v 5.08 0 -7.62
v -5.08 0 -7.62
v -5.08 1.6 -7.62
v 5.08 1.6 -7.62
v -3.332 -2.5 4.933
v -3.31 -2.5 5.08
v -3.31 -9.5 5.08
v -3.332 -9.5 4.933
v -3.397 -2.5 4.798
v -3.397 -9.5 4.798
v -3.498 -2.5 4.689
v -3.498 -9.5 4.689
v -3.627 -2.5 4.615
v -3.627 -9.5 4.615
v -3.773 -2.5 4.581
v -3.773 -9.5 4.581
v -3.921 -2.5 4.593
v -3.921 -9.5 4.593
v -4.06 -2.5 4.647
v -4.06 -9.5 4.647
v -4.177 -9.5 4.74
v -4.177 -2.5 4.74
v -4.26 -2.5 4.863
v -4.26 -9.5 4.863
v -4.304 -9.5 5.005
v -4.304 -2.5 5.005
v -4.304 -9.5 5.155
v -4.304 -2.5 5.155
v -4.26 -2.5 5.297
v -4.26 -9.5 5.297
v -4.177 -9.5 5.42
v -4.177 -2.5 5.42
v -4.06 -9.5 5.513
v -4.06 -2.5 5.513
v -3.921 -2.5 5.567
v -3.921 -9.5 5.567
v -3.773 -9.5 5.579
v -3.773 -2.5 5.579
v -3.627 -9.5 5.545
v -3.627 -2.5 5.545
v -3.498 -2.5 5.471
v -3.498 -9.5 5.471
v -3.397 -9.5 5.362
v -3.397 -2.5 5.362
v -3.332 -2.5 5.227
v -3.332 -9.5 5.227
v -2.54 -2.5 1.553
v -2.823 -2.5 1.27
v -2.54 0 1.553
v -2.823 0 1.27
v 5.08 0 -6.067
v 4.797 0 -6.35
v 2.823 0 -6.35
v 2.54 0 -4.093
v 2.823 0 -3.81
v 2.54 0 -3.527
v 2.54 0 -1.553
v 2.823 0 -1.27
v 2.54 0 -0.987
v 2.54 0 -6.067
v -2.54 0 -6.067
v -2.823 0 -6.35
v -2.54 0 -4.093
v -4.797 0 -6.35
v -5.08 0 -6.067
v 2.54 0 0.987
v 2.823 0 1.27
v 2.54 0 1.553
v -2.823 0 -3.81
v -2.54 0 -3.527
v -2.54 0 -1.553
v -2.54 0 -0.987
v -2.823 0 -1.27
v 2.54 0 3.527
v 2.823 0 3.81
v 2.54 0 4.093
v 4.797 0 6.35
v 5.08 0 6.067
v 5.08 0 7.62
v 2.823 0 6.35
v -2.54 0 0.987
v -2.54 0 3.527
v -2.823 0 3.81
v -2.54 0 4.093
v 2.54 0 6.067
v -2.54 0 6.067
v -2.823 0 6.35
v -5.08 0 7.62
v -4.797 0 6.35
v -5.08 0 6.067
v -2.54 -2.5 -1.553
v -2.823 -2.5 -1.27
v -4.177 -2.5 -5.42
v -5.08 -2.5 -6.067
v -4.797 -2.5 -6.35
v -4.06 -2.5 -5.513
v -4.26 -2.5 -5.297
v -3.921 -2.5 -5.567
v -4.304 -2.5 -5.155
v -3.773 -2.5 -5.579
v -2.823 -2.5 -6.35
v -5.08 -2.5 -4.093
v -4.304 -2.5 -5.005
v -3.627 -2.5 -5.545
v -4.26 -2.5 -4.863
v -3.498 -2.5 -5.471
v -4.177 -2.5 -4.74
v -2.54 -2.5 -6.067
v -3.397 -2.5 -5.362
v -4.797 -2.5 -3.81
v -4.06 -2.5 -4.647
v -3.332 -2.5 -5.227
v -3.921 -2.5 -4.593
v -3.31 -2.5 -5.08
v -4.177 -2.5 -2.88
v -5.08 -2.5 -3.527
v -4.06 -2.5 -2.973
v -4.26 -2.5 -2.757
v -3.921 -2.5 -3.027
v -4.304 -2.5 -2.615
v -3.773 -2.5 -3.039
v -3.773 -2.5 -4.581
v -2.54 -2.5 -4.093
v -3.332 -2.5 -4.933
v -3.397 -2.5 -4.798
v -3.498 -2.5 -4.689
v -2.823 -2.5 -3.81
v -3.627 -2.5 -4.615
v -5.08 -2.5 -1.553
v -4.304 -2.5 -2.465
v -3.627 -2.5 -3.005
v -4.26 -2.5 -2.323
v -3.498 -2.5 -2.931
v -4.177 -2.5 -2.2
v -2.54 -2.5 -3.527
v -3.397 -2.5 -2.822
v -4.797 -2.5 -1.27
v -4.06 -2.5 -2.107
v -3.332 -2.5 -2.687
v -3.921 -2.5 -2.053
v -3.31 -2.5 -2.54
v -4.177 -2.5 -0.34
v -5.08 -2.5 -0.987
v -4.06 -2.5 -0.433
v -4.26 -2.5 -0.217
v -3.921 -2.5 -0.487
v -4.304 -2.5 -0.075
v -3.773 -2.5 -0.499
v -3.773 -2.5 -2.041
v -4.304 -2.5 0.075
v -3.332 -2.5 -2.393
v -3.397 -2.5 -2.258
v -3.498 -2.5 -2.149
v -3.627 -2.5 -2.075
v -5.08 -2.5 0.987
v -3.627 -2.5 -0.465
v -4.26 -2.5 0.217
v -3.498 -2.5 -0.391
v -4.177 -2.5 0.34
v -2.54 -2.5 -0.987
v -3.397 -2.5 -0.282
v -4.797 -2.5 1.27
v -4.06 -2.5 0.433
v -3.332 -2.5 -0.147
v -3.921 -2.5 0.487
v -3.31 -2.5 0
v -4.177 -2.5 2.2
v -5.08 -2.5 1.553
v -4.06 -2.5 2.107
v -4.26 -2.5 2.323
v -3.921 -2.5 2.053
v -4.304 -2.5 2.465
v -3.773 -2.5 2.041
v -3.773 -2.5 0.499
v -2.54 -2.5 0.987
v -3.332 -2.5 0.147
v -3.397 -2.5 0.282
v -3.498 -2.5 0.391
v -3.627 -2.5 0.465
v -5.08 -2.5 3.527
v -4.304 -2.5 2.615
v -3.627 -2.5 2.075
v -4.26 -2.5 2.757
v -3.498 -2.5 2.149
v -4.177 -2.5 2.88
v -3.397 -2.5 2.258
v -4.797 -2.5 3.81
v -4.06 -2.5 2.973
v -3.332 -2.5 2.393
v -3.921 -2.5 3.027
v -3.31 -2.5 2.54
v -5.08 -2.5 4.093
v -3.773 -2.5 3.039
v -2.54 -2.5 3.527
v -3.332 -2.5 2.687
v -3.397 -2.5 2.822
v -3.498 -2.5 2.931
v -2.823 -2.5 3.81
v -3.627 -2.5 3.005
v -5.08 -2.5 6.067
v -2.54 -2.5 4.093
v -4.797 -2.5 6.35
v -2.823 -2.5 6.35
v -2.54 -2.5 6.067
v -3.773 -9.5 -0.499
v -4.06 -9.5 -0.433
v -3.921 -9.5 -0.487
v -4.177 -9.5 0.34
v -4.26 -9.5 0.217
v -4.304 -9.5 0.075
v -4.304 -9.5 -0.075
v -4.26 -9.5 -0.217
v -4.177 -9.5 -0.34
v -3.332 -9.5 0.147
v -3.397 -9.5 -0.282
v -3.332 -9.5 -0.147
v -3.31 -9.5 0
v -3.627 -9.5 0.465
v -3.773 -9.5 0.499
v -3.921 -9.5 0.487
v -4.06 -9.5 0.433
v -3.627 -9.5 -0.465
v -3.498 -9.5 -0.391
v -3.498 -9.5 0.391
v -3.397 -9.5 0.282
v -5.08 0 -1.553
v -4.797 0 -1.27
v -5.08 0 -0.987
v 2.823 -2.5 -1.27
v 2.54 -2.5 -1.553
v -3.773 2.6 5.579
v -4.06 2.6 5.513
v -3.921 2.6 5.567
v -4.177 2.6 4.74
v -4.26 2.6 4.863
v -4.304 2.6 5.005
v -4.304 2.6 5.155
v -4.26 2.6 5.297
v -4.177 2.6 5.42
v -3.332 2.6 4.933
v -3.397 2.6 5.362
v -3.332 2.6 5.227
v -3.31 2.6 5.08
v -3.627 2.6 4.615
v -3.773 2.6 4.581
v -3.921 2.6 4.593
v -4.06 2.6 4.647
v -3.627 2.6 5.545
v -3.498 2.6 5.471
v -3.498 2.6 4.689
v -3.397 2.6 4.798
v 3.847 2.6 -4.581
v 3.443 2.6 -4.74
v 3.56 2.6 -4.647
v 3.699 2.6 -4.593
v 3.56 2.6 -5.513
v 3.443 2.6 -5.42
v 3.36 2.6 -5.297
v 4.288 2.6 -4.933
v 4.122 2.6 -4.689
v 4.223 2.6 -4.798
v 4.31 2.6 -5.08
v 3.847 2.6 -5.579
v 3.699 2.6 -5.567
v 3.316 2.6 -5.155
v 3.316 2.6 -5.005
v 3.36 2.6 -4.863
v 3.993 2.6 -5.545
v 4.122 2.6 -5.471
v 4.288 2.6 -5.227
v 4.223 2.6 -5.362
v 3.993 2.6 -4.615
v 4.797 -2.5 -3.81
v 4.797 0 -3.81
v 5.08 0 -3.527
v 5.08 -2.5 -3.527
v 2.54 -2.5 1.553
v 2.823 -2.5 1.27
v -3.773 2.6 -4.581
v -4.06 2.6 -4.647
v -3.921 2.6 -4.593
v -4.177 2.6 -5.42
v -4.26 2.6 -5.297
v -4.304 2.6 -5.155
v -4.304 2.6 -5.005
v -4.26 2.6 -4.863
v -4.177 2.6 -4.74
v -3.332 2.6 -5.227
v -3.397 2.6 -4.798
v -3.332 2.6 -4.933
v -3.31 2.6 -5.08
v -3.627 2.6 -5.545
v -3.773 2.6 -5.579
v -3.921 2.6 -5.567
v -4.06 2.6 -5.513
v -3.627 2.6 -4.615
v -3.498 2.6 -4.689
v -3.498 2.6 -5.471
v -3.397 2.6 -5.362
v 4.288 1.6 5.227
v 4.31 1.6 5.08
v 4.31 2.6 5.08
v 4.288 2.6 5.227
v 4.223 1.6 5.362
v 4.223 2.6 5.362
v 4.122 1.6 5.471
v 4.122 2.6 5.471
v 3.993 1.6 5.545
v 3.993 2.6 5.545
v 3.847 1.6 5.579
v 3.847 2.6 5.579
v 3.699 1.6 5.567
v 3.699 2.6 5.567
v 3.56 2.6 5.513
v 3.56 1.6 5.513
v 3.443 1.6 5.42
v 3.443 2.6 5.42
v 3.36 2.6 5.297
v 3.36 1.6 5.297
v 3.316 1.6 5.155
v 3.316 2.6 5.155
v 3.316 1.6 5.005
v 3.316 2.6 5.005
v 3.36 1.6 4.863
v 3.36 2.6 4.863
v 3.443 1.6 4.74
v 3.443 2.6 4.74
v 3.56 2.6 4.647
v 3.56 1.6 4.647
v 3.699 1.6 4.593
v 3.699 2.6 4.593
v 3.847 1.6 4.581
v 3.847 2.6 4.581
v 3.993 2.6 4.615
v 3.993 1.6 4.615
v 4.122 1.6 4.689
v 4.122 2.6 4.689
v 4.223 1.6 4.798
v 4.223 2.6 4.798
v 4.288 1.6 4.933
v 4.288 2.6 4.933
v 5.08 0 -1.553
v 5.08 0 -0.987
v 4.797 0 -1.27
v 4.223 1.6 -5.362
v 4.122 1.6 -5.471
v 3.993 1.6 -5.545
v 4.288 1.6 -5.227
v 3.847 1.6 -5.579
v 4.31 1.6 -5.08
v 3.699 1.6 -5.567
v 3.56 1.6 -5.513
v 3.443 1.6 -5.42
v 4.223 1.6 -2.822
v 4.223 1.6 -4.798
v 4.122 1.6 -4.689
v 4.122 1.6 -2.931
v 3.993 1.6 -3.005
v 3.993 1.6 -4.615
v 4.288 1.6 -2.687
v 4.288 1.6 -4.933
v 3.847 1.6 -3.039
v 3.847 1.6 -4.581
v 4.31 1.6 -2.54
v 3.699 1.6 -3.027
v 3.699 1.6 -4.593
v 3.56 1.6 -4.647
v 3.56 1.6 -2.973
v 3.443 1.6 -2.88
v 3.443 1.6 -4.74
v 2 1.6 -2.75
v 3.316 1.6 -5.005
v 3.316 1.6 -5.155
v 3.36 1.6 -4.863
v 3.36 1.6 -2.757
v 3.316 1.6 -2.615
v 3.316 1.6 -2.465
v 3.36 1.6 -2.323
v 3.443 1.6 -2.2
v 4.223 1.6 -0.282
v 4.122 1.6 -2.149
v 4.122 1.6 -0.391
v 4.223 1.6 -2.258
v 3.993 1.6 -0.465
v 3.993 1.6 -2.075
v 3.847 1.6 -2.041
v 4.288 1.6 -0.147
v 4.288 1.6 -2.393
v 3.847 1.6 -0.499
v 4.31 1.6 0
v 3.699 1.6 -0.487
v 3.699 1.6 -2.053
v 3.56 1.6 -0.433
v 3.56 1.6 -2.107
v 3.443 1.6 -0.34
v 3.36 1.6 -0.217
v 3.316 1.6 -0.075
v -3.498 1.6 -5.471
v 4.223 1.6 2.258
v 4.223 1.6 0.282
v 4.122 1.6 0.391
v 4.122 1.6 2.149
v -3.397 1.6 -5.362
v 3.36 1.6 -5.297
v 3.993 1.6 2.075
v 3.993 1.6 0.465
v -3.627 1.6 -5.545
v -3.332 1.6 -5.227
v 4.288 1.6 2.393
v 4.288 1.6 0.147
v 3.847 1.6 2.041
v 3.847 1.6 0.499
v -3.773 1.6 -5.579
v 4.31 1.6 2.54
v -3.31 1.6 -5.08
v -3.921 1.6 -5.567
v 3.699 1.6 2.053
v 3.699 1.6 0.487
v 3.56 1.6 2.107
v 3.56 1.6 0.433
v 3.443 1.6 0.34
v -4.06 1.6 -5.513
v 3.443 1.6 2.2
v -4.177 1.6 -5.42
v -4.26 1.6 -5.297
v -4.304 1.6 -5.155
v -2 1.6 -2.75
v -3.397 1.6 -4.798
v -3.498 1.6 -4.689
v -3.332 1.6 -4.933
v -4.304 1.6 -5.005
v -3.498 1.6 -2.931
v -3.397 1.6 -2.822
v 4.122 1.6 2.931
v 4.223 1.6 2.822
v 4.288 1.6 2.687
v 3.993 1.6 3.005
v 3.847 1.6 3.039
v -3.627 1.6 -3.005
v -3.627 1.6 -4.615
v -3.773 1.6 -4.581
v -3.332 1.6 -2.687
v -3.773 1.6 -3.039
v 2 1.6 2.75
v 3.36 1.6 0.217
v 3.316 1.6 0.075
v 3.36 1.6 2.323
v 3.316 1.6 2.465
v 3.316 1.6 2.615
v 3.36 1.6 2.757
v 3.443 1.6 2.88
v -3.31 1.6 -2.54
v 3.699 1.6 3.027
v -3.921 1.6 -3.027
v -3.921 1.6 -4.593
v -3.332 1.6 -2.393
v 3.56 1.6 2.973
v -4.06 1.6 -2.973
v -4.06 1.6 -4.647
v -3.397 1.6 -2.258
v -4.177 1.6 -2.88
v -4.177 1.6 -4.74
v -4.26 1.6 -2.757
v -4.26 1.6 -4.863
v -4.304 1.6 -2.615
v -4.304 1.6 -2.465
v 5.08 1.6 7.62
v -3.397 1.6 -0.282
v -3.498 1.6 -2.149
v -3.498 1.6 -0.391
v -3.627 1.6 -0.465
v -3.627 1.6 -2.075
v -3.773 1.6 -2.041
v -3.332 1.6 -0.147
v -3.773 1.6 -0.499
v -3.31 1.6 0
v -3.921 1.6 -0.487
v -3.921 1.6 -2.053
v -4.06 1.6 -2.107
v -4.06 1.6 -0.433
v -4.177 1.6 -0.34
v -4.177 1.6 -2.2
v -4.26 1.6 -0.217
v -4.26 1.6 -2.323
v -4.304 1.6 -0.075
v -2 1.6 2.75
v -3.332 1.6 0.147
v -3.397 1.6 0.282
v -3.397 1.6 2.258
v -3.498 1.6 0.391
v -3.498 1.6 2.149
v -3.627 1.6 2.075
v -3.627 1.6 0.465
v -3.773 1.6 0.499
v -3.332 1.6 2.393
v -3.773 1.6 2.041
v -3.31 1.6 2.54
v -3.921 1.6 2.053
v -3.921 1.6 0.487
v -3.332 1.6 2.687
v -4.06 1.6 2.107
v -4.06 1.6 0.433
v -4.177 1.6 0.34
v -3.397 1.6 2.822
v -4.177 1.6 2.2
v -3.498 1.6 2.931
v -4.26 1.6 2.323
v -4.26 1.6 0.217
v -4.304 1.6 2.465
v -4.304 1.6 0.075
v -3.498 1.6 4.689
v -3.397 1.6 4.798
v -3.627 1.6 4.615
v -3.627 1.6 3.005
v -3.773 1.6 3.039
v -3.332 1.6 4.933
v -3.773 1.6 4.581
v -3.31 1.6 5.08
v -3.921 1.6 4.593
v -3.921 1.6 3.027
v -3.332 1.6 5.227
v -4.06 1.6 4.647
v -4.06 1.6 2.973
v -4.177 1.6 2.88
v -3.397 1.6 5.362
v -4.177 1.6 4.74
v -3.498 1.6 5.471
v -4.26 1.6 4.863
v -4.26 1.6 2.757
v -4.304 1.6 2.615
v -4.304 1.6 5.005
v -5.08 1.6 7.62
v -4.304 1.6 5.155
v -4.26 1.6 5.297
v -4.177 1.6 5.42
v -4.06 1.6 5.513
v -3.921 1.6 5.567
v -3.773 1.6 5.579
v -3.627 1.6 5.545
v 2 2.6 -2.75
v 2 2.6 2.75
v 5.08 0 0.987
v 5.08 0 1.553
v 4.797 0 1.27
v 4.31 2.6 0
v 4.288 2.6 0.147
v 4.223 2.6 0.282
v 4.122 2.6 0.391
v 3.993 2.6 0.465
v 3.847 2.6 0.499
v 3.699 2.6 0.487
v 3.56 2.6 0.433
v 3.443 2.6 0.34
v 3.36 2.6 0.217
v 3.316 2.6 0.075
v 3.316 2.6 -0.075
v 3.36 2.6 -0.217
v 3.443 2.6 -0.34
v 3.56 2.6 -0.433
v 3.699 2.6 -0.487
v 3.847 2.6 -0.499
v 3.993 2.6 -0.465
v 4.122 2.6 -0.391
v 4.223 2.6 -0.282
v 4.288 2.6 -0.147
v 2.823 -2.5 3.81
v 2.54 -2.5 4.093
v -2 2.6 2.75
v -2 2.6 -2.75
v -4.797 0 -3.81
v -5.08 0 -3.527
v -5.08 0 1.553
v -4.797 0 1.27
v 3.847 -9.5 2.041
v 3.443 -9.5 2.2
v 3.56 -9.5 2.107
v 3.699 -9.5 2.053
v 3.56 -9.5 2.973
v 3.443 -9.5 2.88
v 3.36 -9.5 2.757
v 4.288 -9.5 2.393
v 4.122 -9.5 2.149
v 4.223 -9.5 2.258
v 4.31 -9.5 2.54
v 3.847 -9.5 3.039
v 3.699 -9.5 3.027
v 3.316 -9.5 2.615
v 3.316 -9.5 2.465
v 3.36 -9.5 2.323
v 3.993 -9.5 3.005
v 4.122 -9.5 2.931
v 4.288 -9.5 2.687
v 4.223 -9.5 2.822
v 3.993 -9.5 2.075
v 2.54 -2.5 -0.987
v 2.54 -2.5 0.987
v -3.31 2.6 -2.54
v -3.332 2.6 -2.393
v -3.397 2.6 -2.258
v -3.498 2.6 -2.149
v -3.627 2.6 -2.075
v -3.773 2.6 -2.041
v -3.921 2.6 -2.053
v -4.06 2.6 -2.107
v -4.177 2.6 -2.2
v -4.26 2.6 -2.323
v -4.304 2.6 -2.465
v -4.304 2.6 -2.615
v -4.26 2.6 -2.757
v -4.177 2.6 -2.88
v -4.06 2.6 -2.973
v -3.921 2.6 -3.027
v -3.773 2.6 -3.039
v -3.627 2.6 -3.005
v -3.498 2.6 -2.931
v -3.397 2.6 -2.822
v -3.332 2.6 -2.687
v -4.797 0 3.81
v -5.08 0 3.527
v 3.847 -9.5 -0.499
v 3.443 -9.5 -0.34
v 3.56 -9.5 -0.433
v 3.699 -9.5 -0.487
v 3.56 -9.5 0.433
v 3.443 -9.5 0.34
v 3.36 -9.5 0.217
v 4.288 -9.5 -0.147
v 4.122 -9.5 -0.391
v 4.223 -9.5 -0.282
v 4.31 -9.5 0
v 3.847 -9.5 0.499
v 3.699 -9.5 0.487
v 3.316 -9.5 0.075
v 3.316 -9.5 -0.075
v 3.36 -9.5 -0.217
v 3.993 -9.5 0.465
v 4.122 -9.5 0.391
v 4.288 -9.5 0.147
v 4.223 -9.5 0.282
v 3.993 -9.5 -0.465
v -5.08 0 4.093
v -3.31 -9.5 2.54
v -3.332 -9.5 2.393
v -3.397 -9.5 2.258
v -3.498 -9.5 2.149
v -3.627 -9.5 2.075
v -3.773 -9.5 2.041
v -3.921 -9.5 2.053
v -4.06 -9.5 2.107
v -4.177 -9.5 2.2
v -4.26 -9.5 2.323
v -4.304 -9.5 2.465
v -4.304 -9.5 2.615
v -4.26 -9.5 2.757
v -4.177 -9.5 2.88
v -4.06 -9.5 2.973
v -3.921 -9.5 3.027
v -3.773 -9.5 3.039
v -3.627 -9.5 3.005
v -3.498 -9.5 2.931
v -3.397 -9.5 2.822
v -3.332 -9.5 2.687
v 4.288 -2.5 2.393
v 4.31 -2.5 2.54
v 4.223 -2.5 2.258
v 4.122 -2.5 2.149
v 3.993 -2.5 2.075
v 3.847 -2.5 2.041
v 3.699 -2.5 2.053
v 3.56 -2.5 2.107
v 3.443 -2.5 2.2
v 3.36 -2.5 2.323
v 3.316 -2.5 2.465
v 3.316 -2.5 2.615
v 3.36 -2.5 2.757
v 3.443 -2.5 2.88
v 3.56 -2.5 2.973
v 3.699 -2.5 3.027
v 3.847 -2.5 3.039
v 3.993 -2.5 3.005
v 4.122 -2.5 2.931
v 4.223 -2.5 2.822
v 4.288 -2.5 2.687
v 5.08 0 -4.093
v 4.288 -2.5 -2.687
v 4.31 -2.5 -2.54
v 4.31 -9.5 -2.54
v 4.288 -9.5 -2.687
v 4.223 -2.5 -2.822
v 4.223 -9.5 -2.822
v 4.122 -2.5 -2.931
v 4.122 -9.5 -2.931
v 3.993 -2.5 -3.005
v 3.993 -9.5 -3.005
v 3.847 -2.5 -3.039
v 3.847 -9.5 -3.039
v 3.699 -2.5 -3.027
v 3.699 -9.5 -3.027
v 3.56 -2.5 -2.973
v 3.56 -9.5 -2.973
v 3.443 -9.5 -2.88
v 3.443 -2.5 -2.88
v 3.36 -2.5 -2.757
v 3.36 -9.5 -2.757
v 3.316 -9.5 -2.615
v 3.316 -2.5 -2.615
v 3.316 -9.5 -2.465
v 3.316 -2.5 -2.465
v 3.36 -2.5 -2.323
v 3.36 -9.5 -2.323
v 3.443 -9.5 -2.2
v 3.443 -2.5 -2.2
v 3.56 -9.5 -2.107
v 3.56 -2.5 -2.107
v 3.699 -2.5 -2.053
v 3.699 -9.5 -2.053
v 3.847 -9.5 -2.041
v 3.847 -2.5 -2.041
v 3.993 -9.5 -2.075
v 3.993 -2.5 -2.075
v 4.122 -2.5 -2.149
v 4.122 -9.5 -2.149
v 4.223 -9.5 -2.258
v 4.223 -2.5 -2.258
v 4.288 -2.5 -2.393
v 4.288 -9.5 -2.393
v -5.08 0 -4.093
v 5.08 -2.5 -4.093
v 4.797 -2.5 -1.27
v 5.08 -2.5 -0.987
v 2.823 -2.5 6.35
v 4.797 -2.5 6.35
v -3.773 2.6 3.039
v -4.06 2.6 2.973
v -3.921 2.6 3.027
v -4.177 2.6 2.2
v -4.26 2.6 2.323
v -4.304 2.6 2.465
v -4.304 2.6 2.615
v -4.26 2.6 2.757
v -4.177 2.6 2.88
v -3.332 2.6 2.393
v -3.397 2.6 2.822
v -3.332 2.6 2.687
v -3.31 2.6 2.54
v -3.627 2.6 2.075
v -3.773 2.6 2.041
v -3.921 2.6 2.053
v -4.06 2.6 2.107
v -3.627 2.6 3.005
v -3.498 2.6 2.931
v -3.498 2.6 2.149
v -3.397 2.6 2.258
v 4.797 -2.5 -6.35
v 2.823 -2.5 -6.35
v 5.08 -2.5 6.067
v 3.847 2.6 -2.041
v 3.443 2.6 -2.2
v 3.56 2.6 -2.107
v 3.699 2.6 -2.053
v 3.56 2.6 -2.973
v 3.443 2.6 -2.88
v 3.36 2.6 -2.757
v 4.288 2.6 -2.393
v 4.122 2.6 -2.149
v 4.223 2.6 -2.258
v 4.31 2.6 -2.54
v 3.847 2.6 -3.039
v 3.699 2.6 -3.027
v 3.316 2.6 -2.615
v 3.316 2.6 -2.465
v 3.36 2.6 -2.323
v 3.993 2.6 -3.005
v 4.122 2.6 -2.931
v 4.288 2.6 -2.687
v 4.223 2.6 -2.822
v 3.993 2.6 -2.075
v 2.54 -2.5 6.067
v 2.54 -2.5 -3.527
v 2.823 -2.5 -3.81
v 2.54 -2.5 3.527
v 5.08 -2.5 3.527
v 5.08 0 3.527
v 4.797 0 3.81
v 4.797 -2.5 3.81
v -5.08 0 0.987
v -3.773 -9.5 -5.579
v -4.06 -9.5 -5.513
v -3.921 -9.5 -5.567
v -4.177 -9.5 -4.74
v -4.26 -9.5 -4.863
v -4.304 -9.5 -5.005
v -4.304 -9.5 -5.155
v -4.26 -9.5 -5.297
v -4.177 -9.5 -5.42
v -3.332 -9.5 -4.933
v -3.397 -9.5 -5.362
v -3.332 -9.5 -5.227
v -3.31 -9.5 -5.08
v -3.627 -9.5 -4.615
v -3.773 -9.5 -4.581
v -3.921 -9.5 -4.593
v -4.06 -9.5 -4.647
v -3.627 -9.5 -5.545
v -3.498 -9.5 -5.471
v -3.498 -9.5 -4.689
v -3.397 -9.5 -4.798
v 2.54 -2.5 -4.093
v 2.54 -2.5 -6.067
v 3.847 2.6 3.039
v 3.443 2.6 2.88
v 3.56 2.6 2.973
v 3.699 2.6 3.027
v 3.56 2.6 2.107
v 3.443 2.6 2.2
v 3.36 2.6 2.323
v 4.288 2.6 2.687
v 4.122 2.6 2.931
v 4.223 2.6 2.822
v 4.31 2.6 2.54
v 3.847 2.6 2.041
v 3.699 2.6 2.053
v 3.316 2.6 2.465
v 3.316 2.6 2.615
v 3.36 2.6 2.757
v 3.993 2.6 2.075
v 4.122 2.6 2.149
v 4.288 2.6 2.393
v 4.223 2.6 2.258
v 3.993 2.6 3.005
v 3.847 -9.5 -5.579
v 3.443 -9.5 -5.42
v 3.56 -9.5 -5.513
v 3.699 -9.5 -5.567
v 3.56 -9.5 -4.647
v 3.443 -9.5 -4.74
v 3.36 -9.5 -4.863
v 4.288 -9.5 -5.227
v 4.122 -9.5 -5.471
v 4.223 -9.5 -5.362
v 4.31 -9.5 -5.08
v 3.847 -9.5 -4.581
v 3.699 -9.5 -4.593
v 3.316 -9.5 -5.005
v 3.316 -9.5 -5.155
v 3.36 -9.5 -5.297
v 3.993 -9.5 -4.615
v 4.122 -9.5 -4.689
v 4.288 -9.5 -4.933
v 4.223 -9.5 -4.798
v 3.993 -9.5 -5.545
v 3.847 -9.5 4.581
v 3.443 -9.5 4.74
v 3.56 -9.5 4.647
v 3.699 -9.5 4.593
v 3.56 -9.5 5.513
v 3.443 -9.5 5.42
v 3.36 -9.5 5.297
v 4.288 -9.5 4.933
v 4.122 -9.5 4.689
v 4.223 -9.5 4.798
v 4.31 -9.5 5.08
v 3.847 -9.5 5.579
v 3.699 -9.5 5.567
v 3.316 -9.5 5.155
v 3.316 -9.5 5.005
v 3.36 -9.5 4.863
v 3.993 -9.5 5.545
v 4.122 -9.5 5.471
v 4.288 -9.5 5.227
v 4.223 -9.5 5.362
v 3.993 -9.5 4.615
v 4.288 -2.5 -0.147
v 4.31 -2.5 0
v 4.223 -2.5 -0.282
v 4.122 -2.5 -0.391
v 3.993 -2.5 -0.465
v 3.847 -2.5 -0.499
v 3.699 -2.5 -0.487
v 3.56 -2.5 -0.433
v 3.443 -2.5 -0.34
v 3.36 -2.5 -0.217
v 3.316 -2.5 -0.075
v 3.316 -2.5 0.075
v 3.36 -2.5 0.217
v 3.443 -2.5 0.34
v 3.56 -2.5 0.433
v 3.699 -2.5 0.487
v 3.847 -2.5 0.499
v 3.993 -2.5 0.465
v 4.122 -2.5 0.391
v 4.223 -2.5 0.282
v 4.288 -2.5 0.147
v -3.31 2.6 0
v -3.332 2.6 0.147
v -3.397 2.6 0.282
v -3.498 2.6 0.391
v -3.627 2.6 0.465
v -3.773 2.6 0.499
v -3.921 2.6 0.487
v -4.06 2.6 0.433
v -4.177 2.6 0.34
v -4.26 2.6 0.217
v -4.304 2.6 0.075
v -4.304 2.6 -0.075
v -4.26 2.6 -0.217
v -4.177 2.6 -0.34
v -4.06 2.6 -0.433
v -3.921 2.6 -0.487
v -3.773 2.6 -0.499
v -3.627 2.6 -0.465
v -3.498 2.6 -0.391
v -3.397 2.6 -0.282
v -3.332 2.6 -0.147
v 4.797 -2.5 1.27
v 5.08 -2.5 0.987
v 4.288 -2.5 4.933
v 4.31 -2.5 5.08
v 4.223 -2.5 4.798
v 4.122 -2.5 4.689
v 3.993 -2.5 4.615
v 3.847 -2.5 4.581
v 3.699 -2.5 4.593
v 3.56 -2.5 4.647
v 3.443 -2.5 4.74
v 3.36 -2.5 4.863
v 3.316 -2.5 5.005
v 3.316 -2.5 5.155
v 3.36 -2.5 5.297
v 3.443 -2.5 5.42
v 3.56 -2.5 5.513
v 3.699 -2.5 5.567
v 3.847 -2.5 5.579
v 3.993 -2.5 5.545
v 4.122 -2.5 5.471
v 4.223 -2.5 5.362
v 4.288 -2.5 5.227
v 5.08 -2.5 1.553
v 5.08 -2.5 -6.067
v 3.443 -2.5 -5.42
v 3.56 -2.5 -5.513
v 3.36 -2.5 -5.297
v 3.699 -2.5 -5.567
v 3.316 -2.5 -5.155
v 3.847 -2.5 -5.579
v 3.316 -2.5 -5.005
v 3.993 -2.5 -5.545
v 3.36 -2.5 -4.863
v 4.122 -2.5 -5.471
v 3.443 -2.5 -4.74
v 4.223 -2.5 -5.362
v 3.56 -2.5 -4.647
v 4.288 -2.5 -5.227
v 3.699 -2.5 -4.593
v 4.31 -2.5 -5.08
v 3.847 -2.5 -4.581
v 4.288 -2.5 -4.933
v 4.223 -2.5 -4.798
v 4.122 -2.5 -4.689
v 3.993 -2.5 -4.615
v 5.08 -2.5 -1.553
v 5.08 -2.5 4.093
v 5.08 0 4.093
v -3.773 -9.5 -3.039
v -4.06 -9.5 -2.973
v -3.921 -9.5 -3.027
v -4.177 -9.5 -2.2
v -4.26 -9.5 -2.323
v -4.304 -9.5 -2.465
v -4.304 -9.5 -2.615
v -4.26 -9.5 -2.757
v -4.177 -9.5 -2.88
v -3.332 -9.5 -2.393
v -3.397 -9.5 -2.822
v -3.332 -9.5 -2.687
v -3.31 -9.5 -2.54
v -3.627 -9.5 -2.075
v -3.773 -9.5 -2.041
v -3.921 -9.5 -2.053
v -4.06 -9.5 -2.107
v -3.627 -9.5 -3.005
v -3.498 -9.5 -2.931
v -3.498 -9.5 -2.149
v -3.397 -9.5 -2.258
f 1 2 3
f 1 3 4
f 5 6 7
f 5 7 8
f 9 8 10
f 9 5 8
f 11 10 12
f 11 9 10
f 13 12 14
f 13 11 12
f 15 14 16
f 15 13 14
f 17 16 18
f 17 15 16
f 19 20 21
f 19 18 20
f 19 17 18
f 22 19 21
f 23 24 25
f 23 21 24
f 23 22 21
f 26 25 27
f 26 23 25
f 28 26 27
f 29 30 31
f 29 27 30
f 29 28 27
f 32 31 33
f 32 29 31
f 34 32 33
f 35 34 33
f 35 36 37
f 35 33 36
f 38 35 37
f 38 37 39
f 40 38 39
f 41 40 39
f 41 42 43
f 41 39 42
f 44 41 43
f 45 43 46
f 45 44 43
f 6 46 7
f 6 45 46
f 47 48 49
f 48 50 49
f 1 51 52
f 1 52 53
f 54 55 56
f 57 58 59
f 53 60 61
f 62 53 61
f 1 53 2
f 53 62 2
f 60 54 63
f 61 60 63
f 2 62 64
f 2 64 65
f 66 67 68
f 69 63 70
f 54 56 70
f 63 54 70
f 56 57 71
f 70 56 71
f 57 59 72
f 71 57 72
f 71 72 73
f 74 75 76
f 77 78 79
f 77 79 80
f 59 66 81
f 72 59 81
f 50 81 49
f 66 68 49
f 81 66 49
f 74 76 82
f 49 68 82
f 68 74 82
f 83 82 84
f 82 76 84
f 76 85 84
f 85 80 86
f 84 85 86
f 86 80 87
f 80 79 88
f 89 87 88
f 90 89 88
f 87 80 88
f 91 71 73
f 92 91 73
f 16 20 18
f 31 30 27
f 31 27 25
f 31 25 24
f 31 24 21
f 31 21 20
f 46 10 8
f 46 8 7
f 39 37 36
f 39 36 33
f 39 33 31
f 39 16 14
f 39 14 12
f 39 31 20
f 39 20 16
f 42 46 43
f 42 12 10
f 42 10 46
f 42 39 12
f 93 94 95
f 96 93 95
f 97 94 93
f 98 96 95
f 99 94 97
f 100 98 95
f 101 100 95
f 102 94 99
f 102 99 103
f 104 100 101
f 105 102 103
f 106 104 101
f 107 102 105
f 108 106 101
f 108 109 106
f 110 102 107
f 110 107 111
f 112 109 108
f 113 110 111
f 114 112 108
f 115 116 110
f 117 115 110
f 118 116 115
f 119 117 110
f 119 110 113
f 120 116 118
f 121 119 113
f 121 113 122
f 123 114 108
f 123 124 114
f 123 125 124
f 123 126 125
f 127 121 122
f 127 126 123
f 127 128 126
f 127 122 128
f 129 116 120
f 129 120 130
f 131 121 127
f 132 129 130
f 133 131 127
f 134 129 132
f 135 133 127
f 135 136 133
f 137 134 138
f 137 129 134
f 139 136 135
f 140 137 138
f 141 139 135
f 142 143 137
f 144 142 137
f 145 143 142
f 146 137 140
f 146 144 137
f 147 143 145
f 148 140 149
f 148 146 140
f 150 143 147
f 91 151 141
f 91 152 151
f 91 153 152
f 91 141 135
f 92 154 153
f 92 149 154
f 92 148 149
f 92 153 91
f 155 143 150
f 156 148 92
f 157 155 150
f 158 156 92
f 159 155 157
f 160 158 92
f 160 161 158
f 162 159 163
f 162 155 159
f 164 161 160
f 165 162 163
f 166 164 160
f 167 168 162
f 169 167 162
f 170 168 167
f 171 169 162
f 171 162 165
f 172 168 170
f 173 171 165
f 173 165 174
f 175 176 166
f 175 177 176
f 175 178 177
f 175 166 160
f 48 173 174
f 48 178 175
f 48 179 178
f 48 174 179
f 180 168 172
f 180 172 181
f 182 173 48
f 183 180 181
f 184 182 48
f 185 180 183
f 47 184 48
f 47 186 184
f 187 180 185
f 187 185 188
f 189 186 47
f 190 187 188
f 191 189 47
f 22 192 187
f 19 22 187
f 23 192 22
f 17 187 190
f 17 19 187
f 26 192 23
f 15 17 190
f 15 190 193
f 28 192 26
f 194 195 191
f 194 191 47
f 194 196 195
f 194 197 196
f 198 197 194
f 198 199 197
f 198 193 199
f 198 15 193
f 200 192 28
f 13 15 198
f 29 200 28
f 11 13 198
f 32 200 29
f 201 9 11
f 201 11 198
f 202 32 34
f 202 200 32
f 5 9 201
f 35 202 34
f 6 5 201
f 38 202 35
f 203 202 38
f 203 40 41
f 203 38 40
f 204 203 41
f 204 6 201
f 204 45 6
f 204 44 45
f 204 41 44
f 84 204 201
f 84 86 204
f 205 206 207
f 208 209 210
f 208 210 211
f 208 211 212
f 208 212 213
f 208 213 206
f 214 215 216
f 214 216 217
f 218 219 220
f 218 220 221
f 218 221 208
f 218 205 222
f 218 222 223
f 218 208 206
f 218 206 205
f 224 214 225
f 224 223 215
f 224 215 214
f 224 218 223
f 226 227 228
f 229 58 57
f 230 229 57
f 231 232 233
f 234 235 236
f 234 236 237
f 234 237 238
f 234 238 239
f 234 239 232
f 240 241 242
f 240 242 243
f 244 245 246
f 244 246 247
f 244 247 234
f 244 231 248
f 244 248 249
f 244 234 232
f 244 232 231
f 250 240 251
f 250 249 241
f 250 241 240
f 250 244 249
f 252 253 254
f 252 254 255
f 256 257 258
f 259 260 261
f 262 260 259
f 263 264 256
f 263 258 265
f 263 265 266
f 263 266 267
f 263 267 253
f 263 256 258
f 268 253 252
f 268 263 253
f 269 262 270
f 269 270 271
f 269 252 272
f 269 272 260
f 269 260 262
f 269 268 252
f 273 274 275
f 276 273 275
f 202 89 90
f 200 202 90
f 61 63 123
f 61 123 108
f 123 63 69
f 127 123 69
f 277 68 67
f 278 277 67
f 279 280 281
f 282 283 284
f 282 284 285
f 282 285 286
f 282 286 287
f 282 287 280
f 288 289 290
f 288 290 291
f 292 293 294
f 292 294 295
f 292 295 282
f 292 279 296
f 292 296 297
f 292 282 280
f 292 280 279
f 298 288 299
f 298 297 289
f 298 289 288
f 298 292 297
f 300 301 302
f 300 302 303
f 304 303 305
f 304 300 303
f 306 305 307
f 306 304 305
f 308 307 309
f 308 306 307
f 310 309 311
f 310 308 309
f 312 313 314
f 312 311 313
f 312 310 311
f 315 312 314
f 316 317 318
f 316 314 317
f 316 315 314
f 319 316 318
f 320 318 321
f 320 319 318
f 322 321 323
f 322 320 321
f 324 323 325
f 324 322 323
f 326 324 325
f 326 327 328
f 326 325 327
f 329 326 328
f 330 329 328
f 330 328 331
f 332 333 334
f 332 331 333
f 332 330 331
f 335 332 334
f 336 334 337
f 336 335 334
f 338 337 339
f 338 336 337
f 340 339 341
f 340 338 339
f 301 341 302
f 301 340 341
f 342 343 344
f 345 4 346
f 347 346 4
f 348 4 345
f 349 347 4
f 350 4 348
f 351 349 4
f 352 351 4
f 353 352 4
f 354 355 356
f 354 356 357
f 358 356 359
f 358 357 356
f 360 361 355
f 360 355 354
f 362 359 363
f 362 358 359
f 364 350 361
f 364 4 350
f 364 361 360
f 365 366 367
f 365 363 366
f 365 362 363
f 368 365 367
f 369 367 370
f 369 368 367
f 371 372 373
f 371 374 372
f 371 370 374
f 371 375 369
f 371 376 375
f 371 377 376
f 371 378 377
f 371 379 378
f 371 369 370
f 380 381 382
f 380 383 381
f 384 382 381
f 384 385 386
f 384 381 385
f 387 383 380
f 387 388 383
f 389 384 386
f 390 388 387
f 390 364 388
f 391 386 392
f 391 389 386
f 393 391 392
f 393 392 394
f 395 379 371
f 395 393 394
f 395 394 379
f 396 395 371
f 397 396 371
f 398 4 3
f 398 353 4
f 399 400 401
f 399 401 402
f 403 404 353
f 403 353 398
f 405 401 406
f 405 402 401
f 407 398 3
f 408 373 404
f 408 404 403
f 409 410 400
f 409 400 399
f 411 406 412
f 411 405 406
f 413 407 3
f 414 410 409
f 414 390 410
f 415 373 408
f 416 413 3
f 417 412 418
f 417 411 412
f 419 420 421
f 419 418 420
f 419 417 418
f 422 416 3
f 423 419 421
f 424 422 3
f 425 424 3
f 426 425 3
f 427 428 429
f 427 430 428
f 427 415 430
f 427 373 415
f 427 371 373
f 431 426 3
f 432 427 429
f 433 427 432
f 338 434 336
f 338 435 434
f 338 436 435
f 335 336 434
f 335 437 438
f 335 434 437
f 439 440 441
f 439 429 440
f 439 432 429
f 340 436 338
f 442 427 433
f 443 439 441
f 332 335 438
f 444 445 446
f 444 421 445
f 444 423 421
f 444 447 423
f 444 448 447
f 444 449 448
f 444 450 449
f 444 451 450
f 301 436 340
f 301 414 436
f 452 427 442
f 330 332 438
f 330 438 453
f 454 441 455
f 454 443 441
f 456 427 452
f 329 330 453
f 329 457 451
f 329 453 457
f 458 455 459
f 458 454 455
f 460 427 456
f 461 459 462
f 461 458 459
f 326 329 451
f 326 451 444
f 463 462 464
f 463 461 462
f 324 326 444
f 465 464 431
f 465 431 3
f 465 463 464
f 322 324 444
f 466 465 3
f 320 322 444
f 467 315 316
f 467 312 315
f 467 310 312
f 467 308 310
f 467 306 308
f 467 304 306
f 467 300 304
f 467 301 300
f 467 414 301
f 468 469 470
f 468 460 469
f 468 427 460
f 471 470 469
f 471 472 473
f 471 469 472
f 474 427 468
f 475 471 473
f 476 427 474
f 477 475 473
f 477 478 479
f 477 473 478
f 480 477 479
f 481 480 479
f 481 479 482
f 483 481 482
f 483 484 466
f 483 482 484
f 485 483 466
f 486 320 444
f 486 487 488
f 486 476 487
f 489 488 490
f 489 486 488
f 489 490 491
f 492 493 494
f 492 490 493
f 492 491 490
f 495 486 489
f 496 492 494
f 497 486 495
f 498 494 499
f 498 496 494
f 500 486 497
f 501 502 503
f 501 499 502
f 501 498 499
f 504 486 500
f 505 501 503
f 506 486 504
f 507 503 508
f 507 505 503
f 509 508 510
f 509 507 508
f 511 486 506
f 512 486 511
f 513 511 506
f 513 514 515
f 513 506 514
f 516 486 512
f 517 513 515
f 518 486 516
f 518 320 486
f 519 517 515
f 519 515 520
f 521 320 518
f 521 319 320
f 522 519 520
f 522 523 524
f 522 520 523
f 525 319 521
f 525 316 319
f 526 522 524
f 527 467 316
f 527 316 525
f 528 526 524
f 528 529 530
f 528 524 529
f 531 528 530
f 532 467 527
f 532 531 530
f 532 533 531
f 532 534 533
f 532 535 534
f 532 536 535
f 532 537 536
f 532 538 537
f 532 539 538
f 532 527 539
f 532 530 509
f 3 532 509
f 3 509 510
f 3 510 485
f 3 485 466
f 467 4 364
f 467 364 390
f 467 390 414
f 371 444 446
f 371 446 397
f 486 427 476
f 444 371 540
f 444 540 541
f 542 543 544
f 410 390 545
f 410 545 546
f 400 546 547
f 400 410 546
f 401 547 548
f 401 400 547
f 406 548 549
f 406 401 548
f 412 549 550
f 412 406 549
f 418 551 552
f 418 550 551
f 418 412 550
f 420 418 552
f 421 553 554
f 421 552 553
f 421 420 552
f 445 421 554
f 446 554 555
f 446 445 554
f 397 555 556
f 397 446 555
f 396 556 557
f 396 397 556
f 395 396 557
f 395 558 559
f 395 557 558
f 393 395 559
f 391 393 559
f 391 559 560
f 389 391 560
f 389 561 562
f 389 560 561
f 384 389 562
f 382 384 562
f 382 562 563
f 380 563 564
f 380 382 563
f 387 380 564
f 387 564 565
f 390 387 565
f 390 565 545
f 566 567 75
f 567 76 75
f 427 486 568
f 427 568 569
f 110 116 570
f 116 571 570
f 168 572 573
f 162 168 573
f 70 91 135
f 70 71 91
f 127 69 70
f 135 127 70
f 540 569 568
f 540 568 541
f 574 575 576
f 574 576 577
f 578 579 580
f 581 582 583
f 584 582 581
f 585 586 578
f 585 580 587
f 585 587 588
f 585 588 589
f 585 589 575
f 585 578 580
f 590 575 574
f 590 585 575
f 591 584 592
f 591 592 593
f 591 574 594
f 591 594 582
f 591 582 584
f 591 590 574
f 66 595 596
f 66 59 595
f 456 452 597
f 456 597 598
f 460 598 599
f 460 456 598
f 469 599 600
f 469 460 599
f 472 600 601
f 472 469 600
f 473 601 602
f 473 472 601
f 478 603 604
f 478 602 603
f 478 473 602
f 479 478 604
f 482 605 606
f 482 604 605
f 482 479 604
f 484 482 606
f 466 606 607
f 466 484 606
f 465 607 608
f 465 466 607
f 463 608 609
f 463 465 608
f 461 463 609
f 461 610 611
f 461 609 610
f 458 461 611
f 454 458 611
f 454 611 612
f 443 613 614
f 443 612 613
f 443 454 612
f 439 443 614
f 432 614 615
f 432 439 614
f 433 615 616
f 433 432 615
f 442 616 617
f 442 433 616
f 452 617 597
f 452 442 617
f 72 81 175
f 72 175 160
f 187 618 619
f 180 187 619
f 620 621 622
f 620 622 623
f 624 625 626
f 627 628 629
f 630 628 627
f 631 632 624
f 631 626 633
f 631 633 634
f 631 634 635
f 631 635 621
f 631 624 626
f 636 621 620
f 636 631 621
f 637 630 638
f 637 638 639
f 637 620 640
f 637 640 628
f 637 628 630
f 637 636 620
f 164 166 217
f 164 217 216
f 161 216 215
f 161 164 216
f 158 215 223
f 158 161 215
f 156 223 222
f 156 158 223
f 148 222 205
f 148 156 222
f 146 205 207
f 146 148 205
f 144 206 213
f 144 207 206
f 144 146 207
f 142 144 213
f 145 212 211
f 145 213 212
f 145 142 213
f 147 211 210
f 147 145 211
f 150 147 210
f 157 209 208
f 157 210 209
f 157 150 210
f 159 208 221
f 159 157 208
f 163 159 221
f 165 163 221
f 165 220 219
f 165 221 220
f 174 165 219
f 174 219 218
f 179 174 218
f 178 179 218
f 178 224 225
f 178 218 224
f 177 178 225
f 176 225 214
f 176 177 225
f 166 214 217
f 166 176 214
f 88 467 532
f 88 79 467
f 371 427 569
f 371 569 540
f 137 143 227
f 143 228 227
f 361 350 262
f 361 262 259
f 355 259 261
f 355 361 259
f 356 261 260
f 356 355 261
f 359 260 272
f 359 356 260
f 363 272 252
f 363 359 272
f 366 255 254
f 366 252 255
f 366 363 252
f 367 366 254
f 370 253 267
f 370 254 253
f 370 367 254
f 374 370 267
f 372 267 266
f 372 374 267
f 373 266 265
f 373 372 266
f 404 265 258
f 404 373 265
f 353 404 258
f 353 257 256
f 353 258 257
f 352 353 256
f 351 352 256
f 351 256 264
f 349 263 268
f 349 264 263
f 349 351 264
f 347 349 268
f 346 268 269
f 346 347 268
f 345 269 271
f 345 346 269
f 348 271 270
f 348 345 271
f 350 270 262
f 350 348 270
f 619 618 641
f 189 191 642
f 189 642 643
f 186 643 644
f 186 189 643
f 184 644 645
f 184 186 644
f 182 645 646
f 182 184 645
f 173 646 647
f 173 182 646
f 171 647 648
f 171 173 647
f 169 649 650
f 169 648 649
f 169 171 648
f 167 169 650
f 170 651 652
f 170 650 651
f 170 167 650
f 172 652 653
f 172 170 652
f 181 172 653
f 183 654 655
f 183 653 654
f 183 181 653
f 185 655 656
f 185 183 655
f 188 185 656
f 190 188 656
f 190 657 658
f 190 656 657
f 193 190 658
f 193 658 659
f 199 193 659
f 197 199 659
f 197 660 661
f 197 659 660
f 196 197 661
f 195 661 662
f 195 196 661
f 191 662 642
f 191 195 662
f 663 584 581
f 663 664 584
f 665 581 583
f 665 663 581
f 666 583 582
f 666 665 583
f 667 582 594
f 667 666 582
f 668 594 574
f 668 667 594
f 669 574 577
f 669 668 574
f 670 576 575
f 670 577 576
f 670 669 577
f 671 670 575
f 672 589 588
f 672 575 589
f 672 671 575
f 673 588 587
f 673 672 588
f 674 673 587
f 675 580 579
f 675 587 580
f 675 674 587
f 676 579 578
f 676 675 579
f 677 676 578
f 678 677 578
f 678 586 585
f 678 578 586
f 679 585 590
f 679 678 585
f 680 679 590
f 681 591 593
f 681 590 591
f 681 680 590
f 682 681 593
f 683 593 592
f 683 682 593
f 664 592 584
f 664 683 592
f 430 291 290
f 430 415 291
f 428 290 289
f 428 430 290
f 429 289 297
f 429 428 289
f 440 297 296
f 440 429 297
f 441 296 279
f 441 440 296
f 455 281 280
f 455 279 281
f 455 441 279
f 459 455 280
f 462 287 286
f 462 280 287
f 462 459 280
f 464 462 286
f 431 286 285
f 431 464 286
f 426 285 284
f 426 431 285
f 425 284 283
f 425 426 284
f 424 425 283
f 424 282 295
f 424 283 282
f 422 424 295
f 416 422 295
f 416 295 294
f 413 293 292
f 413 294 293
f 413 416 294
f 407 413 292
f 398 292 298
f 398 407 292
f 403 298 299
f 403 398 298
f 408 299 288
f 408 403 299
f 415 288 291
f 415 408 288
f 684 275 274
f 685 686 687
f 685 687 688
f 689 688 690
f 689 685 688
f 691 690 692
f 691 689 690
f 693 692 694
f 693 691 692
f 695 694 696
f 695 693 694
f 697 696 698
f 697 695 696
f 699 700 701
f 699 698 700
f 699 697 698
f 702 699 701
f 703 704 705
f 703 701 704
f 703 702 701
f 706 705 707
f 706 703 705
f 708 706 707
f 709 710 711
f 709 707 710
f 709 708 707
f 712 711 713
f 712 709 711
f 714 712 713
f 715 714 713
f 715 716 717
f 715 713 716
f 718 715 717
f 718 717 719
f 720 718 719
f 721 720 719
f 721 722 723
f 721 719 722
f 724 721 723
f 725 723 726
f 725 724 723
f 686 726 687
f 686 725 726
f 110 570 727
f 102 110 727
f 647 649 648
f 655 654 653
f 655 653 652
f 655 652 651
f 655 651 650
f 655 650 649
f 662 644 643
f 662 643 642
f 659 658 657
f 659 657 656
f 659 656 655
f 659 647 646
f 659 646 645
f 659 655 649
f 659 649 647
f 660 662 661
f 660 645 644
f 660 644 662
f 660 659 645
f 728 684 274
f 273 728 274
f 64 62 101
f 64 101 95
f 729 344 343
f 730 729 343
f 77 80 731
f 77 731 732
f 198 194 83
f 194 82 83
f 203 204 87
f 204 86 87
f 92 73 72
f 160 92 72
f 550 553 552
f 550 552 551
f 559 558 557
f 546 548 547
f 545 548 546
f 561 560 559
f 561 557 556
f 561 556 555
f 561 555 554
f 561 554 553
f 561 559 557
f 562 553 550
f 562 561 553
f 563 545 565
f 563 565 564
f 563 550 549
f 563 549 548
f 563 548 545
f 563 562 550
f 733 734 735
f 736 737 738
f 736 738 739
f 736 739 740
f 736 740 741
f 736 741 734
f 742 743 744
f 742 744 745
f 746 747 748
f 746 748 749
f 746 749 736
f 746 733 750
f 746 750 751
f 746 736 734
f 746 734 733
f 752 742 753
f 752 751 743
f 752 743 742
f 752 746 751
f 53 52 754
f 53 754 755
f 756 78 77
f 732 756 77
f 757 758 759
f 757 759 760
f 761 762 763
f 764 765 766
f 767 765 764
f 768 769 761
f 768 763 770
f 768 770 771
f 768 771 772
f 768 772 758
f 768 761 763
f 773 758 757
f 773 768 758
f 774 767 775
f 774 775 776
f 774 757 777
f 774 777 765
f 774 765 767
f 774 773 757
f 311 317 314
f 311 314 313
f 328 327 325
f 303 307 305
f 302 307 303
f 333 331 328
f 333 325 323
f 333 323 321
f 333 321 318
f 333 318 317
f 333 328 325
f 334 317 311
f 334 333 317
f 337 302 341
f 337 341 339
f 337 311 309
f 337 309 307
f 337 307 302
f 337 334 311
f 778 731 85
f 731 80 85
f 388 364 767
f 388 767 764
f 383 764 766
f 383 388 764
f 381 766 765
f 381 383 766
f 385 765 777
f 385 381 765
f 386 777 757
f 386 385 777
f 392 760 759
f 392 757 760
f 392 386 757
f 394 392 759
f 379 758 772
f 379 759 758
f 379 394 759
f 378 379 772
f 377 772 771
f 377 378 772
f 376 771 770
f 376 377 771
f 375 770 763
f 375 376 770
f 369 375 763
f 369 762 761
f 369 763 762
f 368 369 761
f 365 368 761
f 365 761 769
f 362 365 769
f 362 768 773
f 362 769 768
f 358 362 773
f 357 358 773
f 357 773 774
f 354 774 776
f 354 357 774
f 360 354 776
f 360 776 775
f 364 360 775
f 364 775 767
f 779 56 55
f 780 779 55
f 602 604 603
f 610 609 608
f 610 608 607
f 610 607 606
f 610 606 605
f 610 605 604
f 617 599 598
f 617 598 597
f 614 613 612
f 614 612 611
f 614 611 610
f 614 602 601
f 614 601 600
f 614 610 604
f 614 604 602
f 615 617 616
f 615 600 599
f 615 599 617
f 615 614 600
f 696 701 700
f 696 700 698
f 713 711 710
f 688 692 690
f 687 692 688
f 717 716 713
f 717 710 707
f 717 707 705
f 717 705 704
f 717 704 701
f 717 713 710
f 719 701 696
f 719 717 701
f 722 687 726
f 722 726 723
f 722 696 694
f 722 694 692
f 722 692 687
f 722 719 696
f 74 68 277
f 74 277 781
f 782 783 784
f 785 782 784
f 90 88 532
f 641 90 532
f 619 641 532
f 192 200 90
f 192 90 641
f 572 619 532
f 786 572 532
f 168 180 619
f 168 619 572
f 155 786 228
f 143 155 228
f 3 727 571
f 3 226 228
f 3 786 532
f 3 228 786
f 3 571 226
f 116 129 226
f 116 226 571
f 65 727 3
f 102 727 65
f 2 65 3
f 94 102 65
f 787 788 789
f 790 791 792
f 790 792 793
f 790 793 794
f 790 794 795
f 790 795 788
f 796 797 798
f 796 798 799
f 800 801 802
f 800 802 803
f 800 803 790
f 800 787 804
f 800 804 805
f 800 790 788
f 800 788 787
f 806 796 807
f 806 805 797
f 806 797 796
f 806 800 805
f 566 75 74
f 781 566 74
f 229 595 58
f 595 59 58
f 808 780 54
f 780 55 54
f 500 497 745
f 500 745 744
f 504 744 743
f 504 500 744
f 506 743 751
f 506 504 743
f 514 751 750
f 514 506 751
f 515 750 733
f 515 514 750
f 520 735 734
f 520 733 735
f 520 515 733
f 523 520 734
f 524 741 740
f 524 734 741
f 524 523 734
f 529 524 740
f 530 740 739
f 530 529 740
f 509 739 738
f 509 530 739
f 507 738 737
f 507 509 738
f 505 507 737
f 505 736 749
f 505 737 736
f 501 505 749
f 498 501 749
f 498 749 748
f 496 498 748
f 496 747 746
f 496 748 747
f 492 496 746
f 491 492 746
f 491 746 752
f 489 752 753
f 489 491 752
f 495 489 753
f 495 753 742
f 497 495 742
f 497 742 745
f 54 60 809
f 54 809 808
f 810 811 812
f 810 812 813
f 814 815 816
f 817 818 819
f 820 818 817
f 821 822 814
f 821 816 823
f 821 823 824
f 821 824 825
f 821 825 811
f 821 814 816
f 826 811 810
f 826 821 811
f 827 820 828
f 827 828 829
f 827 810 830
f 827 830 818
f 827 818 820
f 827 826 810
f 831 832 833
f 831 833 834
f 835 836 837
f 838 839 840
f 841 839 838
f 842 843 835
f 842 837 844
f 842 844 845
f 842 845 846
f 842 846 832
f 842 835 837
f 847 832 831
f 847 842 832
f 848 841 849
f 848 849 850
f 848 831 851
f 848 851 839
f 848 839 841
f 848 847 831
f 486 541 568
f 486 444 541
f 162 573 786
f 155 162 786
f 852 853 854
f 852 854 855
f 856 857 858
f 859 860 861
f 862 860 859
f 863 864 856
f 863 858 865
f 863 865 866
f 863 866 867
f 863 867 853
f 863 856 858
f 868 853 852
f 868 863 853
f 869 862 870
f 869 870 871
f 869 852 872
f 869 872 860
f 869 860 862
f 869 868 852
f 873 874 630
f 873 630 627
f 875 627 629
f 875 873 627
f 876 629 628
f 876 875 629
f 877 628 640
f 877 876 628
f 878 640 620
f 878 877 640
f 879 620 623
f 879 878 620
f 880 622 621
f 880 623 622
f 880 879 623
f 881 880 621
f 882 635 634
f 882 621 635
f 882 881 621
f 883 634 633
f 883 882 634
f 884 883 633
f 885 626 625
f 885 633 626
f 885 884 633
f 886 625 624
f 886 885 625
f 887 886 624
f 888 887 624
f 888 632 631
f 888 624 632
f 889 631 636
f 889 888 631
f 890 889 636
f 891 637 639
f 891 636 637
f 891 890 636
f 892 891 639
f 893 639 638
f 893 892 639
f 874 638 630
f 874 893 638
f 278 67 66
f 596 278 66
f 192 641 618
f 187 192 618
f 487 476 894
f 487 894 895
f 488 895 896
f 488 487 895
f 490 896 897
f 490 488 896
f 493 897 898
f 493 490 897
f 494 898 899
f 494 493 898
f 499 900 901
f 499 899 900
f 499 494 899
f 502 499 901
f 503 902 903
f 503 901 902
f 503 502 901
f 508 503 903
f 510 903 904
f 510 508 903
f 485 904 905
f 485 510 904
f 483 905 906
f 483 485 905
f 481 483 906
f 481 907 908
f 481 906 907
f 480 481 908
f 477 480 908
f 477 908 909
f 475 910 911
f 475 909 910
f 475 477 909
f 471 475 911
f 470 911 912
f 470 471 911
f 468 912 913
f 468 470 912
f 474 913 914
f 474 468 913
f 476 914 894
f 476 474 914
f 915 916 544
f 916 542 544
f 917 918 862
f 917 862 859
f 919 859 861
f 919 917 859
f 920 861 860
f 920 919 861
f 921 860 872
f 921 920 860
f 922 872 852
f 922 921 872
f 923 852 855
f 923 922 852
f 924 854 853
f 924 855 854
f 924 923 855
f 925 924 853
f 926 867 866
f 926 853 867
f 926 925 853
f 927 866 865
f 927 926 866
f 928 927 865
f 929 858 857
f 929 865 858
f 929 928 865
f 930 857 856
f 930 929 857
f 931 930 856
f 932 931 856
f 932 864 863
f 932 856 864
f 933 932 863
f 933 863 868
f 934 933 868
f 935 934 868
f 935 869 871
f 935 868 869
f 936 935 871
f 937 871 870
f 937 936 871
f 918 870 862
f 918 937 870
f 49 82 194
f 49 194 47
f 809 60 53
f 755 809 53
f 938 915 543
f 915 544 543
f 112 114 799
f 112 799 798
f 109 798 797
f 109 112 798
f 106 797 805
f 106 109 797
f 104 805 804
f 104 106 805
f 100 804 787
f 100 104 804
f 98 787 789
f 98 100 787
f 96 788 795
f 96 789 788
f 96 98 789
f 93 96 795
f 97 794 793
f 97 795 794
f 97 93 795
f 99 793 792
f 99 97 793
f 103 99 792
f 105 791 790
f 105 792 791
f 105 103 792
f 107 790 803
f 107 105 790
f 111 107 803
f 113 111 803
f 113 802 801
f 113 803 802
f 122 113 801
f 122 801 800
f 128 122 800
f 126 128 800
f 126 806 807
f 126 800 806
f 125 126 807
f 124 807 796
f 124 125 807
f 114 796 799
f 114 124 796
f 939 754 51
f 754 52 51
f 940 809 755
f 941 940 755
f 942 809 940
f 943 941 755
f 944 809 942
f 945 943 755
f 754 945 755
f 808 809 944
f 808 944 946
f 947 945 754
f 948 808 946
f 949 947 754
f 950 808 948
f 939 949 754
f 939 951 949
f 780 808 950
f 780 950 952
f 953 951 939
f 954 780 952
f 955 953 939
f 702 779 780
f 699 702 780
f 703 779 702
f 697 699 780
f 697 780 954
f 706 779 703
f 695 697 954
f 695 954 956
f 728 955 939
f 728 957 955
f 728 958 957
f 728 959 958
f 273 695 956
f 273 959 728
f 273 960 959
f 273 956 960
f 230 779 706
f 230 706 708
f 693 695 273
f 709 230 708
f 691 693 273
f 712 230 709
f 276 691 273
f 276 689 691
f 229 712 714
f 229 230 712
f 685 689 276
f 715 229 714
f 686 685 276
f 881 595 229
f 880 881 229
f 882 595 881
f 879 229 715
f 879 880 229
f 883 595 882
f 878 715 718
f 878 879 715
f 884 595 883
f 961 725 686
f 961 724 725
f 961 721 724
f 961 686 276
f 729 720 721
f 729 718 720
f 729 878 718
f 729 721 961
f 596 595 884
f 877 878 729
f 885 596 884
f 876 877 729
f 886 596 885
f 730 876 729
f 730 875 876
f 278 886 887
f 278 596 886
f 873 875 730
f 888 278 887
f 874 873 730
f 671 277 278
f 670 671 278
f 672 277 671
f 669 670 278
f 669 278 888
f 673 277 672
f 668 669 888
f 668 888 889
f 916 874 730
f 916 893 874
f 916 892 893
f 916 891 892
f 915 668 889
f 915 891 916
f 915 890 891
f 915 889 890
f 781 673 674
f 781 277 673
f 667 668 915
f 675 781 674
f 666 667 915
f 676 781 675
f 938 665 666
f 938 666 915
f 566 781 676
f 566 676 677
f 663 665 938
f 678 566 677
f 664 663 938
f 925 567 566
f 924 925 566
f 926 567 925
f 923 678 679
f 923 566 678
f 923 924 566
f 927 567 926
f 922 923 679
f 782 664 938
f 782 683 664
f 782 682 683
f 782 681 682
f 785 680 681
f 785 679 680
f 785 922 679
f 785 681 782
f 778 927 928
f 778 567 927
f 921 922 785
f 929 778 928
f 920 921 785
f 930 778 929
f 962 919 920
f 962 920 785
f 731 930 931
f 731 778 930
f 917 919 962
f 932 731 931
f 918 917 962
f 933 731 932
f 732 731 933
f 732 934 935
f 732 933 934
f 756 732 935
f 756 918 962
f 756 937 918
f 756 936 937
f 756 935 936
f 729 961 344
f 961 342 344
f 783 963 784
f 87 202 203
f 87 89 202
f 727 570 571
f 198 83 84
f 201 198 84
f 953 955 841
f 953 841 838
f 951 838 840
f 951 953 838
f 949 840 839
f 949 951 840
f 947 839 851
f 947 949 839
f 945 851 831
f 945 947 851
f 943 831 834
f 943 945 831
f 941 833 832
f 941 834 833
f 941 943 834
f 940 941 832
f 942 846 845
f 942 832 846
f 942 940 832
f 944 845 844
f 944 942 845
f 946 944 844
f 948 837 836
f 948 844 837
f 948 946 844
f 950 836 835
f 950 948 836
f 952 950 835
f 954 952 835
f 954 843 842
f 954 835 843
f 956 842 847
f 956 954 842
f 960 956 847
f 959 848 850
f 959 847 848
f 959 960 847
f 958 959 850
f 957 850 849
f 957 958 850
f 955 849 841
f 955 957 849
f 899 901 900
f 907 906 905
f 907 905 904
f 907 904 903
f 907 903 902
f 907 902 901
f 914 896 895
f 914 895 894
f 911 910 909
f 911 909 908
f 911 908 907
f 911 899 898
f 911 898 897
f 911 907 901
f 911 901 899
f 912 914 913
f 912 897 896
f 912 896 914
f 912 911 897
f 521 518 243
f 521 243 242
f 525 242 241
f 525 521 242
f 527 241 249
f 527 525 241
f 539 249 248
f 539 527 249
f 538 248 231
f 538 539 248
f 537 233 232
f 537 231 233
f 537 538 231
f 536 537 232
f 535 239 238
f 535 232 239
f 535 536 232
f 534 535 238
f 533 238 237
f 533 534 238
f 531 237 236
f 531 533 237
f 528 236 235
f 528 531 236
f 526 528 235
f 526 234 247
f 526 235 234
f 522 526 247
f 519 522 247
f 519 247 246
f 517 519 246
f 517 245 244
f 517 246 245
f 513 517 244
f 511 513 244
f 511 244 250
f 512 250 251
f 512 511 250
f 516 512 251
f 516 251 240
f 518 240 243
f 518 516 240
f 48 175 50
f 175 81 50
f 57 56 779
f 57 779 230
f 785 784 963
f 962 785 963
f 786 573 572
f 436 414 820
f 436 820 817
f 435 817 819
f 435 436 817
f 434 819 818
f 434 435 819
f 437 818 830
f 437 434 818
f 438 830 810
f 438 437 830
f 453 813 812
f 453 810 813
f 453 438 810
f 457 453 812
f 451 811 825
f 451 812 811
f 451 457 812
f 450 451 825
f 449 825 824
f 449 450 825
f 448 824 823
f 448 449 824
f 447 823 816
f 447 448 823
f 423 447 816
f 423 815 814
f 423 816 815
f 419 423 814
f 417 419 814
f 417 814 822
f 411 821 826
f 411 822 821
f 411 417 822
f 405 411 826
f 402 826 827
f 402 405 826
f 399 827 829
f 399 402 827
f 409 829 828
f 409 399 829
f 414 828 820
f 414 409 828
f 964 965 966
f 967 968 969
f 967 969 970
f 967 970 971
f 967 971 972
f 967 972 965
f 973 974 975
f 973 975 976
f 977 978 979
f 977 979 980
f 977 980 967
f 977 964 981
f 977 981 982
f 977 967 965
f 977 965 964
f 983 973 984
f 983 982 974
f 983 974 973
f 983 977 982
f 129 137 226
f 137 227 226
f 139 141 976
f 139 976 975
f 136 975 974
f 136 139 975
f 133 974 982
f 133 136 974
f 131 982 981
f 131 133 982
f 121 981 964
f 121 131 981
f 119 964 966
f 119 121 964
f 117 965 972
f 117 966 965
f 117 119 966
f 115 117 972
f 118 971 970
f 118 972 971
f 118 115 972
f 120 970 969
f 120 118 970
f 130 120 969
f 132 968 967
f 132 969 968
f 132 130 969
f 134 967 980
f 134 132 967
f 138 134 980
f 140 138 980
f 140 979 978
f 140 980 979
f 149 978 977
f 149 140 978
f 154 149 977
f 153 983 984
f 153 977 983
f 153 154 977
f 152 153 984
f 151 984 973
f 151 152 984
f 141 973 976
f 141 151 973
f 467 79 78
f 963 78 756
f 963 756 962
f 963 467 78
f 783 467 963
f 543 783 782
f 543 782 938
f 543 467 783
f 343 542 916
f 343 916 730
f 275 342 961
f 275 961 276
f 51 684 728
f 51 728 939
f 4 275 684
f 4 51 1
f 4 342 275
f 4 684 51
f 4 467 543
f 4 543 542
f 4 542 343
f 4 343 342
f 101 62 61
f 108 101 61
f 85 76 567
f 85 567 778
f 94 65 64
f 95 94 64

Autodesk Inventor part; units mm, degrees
ref_plane "YZ Plane" through (0, 0, 0) normal (1, 0, 0) x (0, 1, 0)
ref_plane "XZ Plane" through (0, 0, 0) normal (0, 1, 0) x (-1, 0, 0)
ref_plane "XY Plane" through (0, 0, 0) normal (0, 0, 1) x (1, 0, 0)
sketch "スケッチ1" plane through (0, 0, 0) normal (0, 1, 0) x (-1, 0, 0)
  line L0 (-5.08, 7.62) -> (5.08, 7.62)
  line L1 (5.08, 7.62) -> (5.08, -7.62)
  line L2 (5.08, -7.62) -> (-5.08, -7.62)
  line L3 (-5.08, -7.62) -> (-5.08, 7.62)
  line L4 (-5.08, 7.62) -> (5.08, -7.62) construction
  line L5 (5.08, 7.62) -> (-5.08, -7.62) construction
  point P0 (0, 0)
  dimension "d0" = 10.16
  dimension "d1" = 15.24
extrude "押し出し1" add sketch "スケッチ1" along normal blind 1.6
sketch "スケッチ2" plane through (0, 1.6, 0) normal (0, 1, 0) x (1, 0, 0)
  line L0 (2, -2.75) -> (-2, -2.75)
  line L1 (-2, -2.75) -> (-2, 2.75)
  line L2 (-2, 2.75) -> (2, 2.75)
  line L3 (2, 2.75) -> (2, -2.75)
  line L4 (2, -2.75) -> (-2, 2.75) construction
  line L5 (-2, -2.75) -> (2, 2.75) construction
  point P0 (0, 0)
  dimension "d4" = 4
  dimension "d5" = 5.5
extrude "押し出し2" add sketch "スケッチ2" along normal blind 1
sketch "スケッチ3" plane through (0, 0, 0) normal (0, -1, 0) x (1, 0, 0)
  line L0 (2.54, 6.35) -> (5.08, 6.35)
  line L1 (5.08, 6.35) -> (5.08, 3.81)
  line L2 (5.08, 3.81) -> (2.54, 3.81)
  line L3 (2.54, 3.81) -> (2.54, 6.35)
  line L4 (2.54, 6.35) -> (5.08, 3.81) construction
  line L5 (5.08, 6.35) -> (2.54, 3.81) construction
  line L6 (1.5528, 5.08) -> (3.81, 2.8228)
  line L7 (3.81, 2.8228) -> (6.0672, 5.08)
  line L8 (6.0672, 5.08) -> (3.81, 7.3372)
  line L9 (3.81, 7.3372) -> (1.5528, 5.08)
  line L10 (1.5528, 5.08) -> (6.0672, 5.08) construction
  line L11 (3.81, 2.8228) -> (3.81, 7.3372) construction
  point P0 (0, 0)
  point P1 (3.81, 5.08)
  point P2 (3.81, 5.08)
  point P3 (3.81, 5.08)
  point P4 (2.8228, 6.35)
  point P5 (2.54, 6.0672)
  point P6 (2.54, 4.0928)
  point P7 (2.8228, 3.81)
  point P8 (4.7972, 3.81)
  point P9 (5.08, 4.0928)
  point P10 (5.08, 6.0672)
  point P11 (4.7972, 6.35)
  dimension "d8" = 2.54
  dimension "d9" = 2.54
  dimension "d10" = 5.08
  dimension "d11" = 3.81
  dimension "d31" = 0.2
extrude "押し出し3" add sketch "スケッチ3" along normal blind 2.5 contours L0 L8 L1 L7 L2 L6 L3 L9
sketch "スケッチ4" plane through (0, -2.5, 0) normal (0, -1, 0) x (1, 0, 0)
  line L0 (4.7972, 6.35) -> (2.8228, 6.35) projected
  line L1 (5.08, 4.0928) -> (5.08, 6.0672) projected
  circle A0 centre (3.81, 5.08) radius 0.5
  point P0 (0, 0)
  point P1 (4.88, 6.35)
  point P2 (2.74, 6.35)
  point P3 (5.08, 4.01)
  point P4 (5.08, 6.15)
  point P5 (5.08, 5.08)
  point P6 (3.81, 6.35)
  point P7 (5.08, 6.35)
  point P8 (2.54, 6.35)
  point P9 (5.08, 3.81)
  dimension "d17" = 1
extrude "押し出し4" add sketch "スケッチ4" along normal blind 7
sketch "スケッチ5" plane through (0, 1.6, 0) normal (0, 1, 0) x (1, 0, 0)
  circle A0 centre (3.81, -5.08) radius 0.5 projected
  circle A1 centre (3.81, -5.08) radius 0.5 projected
  point P0 (0, 0)
extrude "押し出し5" add sketch "スケッチ5" along normal blind 1
pattern_linear "矩形状パターン2" count 5 spacing 2.54 along (0, 0, -1) count 2 spacing 7.62 along (-1, 0, 0) of "押し出し3", "押し出し4", "押し出し5"
properties part number "bno055_module"
